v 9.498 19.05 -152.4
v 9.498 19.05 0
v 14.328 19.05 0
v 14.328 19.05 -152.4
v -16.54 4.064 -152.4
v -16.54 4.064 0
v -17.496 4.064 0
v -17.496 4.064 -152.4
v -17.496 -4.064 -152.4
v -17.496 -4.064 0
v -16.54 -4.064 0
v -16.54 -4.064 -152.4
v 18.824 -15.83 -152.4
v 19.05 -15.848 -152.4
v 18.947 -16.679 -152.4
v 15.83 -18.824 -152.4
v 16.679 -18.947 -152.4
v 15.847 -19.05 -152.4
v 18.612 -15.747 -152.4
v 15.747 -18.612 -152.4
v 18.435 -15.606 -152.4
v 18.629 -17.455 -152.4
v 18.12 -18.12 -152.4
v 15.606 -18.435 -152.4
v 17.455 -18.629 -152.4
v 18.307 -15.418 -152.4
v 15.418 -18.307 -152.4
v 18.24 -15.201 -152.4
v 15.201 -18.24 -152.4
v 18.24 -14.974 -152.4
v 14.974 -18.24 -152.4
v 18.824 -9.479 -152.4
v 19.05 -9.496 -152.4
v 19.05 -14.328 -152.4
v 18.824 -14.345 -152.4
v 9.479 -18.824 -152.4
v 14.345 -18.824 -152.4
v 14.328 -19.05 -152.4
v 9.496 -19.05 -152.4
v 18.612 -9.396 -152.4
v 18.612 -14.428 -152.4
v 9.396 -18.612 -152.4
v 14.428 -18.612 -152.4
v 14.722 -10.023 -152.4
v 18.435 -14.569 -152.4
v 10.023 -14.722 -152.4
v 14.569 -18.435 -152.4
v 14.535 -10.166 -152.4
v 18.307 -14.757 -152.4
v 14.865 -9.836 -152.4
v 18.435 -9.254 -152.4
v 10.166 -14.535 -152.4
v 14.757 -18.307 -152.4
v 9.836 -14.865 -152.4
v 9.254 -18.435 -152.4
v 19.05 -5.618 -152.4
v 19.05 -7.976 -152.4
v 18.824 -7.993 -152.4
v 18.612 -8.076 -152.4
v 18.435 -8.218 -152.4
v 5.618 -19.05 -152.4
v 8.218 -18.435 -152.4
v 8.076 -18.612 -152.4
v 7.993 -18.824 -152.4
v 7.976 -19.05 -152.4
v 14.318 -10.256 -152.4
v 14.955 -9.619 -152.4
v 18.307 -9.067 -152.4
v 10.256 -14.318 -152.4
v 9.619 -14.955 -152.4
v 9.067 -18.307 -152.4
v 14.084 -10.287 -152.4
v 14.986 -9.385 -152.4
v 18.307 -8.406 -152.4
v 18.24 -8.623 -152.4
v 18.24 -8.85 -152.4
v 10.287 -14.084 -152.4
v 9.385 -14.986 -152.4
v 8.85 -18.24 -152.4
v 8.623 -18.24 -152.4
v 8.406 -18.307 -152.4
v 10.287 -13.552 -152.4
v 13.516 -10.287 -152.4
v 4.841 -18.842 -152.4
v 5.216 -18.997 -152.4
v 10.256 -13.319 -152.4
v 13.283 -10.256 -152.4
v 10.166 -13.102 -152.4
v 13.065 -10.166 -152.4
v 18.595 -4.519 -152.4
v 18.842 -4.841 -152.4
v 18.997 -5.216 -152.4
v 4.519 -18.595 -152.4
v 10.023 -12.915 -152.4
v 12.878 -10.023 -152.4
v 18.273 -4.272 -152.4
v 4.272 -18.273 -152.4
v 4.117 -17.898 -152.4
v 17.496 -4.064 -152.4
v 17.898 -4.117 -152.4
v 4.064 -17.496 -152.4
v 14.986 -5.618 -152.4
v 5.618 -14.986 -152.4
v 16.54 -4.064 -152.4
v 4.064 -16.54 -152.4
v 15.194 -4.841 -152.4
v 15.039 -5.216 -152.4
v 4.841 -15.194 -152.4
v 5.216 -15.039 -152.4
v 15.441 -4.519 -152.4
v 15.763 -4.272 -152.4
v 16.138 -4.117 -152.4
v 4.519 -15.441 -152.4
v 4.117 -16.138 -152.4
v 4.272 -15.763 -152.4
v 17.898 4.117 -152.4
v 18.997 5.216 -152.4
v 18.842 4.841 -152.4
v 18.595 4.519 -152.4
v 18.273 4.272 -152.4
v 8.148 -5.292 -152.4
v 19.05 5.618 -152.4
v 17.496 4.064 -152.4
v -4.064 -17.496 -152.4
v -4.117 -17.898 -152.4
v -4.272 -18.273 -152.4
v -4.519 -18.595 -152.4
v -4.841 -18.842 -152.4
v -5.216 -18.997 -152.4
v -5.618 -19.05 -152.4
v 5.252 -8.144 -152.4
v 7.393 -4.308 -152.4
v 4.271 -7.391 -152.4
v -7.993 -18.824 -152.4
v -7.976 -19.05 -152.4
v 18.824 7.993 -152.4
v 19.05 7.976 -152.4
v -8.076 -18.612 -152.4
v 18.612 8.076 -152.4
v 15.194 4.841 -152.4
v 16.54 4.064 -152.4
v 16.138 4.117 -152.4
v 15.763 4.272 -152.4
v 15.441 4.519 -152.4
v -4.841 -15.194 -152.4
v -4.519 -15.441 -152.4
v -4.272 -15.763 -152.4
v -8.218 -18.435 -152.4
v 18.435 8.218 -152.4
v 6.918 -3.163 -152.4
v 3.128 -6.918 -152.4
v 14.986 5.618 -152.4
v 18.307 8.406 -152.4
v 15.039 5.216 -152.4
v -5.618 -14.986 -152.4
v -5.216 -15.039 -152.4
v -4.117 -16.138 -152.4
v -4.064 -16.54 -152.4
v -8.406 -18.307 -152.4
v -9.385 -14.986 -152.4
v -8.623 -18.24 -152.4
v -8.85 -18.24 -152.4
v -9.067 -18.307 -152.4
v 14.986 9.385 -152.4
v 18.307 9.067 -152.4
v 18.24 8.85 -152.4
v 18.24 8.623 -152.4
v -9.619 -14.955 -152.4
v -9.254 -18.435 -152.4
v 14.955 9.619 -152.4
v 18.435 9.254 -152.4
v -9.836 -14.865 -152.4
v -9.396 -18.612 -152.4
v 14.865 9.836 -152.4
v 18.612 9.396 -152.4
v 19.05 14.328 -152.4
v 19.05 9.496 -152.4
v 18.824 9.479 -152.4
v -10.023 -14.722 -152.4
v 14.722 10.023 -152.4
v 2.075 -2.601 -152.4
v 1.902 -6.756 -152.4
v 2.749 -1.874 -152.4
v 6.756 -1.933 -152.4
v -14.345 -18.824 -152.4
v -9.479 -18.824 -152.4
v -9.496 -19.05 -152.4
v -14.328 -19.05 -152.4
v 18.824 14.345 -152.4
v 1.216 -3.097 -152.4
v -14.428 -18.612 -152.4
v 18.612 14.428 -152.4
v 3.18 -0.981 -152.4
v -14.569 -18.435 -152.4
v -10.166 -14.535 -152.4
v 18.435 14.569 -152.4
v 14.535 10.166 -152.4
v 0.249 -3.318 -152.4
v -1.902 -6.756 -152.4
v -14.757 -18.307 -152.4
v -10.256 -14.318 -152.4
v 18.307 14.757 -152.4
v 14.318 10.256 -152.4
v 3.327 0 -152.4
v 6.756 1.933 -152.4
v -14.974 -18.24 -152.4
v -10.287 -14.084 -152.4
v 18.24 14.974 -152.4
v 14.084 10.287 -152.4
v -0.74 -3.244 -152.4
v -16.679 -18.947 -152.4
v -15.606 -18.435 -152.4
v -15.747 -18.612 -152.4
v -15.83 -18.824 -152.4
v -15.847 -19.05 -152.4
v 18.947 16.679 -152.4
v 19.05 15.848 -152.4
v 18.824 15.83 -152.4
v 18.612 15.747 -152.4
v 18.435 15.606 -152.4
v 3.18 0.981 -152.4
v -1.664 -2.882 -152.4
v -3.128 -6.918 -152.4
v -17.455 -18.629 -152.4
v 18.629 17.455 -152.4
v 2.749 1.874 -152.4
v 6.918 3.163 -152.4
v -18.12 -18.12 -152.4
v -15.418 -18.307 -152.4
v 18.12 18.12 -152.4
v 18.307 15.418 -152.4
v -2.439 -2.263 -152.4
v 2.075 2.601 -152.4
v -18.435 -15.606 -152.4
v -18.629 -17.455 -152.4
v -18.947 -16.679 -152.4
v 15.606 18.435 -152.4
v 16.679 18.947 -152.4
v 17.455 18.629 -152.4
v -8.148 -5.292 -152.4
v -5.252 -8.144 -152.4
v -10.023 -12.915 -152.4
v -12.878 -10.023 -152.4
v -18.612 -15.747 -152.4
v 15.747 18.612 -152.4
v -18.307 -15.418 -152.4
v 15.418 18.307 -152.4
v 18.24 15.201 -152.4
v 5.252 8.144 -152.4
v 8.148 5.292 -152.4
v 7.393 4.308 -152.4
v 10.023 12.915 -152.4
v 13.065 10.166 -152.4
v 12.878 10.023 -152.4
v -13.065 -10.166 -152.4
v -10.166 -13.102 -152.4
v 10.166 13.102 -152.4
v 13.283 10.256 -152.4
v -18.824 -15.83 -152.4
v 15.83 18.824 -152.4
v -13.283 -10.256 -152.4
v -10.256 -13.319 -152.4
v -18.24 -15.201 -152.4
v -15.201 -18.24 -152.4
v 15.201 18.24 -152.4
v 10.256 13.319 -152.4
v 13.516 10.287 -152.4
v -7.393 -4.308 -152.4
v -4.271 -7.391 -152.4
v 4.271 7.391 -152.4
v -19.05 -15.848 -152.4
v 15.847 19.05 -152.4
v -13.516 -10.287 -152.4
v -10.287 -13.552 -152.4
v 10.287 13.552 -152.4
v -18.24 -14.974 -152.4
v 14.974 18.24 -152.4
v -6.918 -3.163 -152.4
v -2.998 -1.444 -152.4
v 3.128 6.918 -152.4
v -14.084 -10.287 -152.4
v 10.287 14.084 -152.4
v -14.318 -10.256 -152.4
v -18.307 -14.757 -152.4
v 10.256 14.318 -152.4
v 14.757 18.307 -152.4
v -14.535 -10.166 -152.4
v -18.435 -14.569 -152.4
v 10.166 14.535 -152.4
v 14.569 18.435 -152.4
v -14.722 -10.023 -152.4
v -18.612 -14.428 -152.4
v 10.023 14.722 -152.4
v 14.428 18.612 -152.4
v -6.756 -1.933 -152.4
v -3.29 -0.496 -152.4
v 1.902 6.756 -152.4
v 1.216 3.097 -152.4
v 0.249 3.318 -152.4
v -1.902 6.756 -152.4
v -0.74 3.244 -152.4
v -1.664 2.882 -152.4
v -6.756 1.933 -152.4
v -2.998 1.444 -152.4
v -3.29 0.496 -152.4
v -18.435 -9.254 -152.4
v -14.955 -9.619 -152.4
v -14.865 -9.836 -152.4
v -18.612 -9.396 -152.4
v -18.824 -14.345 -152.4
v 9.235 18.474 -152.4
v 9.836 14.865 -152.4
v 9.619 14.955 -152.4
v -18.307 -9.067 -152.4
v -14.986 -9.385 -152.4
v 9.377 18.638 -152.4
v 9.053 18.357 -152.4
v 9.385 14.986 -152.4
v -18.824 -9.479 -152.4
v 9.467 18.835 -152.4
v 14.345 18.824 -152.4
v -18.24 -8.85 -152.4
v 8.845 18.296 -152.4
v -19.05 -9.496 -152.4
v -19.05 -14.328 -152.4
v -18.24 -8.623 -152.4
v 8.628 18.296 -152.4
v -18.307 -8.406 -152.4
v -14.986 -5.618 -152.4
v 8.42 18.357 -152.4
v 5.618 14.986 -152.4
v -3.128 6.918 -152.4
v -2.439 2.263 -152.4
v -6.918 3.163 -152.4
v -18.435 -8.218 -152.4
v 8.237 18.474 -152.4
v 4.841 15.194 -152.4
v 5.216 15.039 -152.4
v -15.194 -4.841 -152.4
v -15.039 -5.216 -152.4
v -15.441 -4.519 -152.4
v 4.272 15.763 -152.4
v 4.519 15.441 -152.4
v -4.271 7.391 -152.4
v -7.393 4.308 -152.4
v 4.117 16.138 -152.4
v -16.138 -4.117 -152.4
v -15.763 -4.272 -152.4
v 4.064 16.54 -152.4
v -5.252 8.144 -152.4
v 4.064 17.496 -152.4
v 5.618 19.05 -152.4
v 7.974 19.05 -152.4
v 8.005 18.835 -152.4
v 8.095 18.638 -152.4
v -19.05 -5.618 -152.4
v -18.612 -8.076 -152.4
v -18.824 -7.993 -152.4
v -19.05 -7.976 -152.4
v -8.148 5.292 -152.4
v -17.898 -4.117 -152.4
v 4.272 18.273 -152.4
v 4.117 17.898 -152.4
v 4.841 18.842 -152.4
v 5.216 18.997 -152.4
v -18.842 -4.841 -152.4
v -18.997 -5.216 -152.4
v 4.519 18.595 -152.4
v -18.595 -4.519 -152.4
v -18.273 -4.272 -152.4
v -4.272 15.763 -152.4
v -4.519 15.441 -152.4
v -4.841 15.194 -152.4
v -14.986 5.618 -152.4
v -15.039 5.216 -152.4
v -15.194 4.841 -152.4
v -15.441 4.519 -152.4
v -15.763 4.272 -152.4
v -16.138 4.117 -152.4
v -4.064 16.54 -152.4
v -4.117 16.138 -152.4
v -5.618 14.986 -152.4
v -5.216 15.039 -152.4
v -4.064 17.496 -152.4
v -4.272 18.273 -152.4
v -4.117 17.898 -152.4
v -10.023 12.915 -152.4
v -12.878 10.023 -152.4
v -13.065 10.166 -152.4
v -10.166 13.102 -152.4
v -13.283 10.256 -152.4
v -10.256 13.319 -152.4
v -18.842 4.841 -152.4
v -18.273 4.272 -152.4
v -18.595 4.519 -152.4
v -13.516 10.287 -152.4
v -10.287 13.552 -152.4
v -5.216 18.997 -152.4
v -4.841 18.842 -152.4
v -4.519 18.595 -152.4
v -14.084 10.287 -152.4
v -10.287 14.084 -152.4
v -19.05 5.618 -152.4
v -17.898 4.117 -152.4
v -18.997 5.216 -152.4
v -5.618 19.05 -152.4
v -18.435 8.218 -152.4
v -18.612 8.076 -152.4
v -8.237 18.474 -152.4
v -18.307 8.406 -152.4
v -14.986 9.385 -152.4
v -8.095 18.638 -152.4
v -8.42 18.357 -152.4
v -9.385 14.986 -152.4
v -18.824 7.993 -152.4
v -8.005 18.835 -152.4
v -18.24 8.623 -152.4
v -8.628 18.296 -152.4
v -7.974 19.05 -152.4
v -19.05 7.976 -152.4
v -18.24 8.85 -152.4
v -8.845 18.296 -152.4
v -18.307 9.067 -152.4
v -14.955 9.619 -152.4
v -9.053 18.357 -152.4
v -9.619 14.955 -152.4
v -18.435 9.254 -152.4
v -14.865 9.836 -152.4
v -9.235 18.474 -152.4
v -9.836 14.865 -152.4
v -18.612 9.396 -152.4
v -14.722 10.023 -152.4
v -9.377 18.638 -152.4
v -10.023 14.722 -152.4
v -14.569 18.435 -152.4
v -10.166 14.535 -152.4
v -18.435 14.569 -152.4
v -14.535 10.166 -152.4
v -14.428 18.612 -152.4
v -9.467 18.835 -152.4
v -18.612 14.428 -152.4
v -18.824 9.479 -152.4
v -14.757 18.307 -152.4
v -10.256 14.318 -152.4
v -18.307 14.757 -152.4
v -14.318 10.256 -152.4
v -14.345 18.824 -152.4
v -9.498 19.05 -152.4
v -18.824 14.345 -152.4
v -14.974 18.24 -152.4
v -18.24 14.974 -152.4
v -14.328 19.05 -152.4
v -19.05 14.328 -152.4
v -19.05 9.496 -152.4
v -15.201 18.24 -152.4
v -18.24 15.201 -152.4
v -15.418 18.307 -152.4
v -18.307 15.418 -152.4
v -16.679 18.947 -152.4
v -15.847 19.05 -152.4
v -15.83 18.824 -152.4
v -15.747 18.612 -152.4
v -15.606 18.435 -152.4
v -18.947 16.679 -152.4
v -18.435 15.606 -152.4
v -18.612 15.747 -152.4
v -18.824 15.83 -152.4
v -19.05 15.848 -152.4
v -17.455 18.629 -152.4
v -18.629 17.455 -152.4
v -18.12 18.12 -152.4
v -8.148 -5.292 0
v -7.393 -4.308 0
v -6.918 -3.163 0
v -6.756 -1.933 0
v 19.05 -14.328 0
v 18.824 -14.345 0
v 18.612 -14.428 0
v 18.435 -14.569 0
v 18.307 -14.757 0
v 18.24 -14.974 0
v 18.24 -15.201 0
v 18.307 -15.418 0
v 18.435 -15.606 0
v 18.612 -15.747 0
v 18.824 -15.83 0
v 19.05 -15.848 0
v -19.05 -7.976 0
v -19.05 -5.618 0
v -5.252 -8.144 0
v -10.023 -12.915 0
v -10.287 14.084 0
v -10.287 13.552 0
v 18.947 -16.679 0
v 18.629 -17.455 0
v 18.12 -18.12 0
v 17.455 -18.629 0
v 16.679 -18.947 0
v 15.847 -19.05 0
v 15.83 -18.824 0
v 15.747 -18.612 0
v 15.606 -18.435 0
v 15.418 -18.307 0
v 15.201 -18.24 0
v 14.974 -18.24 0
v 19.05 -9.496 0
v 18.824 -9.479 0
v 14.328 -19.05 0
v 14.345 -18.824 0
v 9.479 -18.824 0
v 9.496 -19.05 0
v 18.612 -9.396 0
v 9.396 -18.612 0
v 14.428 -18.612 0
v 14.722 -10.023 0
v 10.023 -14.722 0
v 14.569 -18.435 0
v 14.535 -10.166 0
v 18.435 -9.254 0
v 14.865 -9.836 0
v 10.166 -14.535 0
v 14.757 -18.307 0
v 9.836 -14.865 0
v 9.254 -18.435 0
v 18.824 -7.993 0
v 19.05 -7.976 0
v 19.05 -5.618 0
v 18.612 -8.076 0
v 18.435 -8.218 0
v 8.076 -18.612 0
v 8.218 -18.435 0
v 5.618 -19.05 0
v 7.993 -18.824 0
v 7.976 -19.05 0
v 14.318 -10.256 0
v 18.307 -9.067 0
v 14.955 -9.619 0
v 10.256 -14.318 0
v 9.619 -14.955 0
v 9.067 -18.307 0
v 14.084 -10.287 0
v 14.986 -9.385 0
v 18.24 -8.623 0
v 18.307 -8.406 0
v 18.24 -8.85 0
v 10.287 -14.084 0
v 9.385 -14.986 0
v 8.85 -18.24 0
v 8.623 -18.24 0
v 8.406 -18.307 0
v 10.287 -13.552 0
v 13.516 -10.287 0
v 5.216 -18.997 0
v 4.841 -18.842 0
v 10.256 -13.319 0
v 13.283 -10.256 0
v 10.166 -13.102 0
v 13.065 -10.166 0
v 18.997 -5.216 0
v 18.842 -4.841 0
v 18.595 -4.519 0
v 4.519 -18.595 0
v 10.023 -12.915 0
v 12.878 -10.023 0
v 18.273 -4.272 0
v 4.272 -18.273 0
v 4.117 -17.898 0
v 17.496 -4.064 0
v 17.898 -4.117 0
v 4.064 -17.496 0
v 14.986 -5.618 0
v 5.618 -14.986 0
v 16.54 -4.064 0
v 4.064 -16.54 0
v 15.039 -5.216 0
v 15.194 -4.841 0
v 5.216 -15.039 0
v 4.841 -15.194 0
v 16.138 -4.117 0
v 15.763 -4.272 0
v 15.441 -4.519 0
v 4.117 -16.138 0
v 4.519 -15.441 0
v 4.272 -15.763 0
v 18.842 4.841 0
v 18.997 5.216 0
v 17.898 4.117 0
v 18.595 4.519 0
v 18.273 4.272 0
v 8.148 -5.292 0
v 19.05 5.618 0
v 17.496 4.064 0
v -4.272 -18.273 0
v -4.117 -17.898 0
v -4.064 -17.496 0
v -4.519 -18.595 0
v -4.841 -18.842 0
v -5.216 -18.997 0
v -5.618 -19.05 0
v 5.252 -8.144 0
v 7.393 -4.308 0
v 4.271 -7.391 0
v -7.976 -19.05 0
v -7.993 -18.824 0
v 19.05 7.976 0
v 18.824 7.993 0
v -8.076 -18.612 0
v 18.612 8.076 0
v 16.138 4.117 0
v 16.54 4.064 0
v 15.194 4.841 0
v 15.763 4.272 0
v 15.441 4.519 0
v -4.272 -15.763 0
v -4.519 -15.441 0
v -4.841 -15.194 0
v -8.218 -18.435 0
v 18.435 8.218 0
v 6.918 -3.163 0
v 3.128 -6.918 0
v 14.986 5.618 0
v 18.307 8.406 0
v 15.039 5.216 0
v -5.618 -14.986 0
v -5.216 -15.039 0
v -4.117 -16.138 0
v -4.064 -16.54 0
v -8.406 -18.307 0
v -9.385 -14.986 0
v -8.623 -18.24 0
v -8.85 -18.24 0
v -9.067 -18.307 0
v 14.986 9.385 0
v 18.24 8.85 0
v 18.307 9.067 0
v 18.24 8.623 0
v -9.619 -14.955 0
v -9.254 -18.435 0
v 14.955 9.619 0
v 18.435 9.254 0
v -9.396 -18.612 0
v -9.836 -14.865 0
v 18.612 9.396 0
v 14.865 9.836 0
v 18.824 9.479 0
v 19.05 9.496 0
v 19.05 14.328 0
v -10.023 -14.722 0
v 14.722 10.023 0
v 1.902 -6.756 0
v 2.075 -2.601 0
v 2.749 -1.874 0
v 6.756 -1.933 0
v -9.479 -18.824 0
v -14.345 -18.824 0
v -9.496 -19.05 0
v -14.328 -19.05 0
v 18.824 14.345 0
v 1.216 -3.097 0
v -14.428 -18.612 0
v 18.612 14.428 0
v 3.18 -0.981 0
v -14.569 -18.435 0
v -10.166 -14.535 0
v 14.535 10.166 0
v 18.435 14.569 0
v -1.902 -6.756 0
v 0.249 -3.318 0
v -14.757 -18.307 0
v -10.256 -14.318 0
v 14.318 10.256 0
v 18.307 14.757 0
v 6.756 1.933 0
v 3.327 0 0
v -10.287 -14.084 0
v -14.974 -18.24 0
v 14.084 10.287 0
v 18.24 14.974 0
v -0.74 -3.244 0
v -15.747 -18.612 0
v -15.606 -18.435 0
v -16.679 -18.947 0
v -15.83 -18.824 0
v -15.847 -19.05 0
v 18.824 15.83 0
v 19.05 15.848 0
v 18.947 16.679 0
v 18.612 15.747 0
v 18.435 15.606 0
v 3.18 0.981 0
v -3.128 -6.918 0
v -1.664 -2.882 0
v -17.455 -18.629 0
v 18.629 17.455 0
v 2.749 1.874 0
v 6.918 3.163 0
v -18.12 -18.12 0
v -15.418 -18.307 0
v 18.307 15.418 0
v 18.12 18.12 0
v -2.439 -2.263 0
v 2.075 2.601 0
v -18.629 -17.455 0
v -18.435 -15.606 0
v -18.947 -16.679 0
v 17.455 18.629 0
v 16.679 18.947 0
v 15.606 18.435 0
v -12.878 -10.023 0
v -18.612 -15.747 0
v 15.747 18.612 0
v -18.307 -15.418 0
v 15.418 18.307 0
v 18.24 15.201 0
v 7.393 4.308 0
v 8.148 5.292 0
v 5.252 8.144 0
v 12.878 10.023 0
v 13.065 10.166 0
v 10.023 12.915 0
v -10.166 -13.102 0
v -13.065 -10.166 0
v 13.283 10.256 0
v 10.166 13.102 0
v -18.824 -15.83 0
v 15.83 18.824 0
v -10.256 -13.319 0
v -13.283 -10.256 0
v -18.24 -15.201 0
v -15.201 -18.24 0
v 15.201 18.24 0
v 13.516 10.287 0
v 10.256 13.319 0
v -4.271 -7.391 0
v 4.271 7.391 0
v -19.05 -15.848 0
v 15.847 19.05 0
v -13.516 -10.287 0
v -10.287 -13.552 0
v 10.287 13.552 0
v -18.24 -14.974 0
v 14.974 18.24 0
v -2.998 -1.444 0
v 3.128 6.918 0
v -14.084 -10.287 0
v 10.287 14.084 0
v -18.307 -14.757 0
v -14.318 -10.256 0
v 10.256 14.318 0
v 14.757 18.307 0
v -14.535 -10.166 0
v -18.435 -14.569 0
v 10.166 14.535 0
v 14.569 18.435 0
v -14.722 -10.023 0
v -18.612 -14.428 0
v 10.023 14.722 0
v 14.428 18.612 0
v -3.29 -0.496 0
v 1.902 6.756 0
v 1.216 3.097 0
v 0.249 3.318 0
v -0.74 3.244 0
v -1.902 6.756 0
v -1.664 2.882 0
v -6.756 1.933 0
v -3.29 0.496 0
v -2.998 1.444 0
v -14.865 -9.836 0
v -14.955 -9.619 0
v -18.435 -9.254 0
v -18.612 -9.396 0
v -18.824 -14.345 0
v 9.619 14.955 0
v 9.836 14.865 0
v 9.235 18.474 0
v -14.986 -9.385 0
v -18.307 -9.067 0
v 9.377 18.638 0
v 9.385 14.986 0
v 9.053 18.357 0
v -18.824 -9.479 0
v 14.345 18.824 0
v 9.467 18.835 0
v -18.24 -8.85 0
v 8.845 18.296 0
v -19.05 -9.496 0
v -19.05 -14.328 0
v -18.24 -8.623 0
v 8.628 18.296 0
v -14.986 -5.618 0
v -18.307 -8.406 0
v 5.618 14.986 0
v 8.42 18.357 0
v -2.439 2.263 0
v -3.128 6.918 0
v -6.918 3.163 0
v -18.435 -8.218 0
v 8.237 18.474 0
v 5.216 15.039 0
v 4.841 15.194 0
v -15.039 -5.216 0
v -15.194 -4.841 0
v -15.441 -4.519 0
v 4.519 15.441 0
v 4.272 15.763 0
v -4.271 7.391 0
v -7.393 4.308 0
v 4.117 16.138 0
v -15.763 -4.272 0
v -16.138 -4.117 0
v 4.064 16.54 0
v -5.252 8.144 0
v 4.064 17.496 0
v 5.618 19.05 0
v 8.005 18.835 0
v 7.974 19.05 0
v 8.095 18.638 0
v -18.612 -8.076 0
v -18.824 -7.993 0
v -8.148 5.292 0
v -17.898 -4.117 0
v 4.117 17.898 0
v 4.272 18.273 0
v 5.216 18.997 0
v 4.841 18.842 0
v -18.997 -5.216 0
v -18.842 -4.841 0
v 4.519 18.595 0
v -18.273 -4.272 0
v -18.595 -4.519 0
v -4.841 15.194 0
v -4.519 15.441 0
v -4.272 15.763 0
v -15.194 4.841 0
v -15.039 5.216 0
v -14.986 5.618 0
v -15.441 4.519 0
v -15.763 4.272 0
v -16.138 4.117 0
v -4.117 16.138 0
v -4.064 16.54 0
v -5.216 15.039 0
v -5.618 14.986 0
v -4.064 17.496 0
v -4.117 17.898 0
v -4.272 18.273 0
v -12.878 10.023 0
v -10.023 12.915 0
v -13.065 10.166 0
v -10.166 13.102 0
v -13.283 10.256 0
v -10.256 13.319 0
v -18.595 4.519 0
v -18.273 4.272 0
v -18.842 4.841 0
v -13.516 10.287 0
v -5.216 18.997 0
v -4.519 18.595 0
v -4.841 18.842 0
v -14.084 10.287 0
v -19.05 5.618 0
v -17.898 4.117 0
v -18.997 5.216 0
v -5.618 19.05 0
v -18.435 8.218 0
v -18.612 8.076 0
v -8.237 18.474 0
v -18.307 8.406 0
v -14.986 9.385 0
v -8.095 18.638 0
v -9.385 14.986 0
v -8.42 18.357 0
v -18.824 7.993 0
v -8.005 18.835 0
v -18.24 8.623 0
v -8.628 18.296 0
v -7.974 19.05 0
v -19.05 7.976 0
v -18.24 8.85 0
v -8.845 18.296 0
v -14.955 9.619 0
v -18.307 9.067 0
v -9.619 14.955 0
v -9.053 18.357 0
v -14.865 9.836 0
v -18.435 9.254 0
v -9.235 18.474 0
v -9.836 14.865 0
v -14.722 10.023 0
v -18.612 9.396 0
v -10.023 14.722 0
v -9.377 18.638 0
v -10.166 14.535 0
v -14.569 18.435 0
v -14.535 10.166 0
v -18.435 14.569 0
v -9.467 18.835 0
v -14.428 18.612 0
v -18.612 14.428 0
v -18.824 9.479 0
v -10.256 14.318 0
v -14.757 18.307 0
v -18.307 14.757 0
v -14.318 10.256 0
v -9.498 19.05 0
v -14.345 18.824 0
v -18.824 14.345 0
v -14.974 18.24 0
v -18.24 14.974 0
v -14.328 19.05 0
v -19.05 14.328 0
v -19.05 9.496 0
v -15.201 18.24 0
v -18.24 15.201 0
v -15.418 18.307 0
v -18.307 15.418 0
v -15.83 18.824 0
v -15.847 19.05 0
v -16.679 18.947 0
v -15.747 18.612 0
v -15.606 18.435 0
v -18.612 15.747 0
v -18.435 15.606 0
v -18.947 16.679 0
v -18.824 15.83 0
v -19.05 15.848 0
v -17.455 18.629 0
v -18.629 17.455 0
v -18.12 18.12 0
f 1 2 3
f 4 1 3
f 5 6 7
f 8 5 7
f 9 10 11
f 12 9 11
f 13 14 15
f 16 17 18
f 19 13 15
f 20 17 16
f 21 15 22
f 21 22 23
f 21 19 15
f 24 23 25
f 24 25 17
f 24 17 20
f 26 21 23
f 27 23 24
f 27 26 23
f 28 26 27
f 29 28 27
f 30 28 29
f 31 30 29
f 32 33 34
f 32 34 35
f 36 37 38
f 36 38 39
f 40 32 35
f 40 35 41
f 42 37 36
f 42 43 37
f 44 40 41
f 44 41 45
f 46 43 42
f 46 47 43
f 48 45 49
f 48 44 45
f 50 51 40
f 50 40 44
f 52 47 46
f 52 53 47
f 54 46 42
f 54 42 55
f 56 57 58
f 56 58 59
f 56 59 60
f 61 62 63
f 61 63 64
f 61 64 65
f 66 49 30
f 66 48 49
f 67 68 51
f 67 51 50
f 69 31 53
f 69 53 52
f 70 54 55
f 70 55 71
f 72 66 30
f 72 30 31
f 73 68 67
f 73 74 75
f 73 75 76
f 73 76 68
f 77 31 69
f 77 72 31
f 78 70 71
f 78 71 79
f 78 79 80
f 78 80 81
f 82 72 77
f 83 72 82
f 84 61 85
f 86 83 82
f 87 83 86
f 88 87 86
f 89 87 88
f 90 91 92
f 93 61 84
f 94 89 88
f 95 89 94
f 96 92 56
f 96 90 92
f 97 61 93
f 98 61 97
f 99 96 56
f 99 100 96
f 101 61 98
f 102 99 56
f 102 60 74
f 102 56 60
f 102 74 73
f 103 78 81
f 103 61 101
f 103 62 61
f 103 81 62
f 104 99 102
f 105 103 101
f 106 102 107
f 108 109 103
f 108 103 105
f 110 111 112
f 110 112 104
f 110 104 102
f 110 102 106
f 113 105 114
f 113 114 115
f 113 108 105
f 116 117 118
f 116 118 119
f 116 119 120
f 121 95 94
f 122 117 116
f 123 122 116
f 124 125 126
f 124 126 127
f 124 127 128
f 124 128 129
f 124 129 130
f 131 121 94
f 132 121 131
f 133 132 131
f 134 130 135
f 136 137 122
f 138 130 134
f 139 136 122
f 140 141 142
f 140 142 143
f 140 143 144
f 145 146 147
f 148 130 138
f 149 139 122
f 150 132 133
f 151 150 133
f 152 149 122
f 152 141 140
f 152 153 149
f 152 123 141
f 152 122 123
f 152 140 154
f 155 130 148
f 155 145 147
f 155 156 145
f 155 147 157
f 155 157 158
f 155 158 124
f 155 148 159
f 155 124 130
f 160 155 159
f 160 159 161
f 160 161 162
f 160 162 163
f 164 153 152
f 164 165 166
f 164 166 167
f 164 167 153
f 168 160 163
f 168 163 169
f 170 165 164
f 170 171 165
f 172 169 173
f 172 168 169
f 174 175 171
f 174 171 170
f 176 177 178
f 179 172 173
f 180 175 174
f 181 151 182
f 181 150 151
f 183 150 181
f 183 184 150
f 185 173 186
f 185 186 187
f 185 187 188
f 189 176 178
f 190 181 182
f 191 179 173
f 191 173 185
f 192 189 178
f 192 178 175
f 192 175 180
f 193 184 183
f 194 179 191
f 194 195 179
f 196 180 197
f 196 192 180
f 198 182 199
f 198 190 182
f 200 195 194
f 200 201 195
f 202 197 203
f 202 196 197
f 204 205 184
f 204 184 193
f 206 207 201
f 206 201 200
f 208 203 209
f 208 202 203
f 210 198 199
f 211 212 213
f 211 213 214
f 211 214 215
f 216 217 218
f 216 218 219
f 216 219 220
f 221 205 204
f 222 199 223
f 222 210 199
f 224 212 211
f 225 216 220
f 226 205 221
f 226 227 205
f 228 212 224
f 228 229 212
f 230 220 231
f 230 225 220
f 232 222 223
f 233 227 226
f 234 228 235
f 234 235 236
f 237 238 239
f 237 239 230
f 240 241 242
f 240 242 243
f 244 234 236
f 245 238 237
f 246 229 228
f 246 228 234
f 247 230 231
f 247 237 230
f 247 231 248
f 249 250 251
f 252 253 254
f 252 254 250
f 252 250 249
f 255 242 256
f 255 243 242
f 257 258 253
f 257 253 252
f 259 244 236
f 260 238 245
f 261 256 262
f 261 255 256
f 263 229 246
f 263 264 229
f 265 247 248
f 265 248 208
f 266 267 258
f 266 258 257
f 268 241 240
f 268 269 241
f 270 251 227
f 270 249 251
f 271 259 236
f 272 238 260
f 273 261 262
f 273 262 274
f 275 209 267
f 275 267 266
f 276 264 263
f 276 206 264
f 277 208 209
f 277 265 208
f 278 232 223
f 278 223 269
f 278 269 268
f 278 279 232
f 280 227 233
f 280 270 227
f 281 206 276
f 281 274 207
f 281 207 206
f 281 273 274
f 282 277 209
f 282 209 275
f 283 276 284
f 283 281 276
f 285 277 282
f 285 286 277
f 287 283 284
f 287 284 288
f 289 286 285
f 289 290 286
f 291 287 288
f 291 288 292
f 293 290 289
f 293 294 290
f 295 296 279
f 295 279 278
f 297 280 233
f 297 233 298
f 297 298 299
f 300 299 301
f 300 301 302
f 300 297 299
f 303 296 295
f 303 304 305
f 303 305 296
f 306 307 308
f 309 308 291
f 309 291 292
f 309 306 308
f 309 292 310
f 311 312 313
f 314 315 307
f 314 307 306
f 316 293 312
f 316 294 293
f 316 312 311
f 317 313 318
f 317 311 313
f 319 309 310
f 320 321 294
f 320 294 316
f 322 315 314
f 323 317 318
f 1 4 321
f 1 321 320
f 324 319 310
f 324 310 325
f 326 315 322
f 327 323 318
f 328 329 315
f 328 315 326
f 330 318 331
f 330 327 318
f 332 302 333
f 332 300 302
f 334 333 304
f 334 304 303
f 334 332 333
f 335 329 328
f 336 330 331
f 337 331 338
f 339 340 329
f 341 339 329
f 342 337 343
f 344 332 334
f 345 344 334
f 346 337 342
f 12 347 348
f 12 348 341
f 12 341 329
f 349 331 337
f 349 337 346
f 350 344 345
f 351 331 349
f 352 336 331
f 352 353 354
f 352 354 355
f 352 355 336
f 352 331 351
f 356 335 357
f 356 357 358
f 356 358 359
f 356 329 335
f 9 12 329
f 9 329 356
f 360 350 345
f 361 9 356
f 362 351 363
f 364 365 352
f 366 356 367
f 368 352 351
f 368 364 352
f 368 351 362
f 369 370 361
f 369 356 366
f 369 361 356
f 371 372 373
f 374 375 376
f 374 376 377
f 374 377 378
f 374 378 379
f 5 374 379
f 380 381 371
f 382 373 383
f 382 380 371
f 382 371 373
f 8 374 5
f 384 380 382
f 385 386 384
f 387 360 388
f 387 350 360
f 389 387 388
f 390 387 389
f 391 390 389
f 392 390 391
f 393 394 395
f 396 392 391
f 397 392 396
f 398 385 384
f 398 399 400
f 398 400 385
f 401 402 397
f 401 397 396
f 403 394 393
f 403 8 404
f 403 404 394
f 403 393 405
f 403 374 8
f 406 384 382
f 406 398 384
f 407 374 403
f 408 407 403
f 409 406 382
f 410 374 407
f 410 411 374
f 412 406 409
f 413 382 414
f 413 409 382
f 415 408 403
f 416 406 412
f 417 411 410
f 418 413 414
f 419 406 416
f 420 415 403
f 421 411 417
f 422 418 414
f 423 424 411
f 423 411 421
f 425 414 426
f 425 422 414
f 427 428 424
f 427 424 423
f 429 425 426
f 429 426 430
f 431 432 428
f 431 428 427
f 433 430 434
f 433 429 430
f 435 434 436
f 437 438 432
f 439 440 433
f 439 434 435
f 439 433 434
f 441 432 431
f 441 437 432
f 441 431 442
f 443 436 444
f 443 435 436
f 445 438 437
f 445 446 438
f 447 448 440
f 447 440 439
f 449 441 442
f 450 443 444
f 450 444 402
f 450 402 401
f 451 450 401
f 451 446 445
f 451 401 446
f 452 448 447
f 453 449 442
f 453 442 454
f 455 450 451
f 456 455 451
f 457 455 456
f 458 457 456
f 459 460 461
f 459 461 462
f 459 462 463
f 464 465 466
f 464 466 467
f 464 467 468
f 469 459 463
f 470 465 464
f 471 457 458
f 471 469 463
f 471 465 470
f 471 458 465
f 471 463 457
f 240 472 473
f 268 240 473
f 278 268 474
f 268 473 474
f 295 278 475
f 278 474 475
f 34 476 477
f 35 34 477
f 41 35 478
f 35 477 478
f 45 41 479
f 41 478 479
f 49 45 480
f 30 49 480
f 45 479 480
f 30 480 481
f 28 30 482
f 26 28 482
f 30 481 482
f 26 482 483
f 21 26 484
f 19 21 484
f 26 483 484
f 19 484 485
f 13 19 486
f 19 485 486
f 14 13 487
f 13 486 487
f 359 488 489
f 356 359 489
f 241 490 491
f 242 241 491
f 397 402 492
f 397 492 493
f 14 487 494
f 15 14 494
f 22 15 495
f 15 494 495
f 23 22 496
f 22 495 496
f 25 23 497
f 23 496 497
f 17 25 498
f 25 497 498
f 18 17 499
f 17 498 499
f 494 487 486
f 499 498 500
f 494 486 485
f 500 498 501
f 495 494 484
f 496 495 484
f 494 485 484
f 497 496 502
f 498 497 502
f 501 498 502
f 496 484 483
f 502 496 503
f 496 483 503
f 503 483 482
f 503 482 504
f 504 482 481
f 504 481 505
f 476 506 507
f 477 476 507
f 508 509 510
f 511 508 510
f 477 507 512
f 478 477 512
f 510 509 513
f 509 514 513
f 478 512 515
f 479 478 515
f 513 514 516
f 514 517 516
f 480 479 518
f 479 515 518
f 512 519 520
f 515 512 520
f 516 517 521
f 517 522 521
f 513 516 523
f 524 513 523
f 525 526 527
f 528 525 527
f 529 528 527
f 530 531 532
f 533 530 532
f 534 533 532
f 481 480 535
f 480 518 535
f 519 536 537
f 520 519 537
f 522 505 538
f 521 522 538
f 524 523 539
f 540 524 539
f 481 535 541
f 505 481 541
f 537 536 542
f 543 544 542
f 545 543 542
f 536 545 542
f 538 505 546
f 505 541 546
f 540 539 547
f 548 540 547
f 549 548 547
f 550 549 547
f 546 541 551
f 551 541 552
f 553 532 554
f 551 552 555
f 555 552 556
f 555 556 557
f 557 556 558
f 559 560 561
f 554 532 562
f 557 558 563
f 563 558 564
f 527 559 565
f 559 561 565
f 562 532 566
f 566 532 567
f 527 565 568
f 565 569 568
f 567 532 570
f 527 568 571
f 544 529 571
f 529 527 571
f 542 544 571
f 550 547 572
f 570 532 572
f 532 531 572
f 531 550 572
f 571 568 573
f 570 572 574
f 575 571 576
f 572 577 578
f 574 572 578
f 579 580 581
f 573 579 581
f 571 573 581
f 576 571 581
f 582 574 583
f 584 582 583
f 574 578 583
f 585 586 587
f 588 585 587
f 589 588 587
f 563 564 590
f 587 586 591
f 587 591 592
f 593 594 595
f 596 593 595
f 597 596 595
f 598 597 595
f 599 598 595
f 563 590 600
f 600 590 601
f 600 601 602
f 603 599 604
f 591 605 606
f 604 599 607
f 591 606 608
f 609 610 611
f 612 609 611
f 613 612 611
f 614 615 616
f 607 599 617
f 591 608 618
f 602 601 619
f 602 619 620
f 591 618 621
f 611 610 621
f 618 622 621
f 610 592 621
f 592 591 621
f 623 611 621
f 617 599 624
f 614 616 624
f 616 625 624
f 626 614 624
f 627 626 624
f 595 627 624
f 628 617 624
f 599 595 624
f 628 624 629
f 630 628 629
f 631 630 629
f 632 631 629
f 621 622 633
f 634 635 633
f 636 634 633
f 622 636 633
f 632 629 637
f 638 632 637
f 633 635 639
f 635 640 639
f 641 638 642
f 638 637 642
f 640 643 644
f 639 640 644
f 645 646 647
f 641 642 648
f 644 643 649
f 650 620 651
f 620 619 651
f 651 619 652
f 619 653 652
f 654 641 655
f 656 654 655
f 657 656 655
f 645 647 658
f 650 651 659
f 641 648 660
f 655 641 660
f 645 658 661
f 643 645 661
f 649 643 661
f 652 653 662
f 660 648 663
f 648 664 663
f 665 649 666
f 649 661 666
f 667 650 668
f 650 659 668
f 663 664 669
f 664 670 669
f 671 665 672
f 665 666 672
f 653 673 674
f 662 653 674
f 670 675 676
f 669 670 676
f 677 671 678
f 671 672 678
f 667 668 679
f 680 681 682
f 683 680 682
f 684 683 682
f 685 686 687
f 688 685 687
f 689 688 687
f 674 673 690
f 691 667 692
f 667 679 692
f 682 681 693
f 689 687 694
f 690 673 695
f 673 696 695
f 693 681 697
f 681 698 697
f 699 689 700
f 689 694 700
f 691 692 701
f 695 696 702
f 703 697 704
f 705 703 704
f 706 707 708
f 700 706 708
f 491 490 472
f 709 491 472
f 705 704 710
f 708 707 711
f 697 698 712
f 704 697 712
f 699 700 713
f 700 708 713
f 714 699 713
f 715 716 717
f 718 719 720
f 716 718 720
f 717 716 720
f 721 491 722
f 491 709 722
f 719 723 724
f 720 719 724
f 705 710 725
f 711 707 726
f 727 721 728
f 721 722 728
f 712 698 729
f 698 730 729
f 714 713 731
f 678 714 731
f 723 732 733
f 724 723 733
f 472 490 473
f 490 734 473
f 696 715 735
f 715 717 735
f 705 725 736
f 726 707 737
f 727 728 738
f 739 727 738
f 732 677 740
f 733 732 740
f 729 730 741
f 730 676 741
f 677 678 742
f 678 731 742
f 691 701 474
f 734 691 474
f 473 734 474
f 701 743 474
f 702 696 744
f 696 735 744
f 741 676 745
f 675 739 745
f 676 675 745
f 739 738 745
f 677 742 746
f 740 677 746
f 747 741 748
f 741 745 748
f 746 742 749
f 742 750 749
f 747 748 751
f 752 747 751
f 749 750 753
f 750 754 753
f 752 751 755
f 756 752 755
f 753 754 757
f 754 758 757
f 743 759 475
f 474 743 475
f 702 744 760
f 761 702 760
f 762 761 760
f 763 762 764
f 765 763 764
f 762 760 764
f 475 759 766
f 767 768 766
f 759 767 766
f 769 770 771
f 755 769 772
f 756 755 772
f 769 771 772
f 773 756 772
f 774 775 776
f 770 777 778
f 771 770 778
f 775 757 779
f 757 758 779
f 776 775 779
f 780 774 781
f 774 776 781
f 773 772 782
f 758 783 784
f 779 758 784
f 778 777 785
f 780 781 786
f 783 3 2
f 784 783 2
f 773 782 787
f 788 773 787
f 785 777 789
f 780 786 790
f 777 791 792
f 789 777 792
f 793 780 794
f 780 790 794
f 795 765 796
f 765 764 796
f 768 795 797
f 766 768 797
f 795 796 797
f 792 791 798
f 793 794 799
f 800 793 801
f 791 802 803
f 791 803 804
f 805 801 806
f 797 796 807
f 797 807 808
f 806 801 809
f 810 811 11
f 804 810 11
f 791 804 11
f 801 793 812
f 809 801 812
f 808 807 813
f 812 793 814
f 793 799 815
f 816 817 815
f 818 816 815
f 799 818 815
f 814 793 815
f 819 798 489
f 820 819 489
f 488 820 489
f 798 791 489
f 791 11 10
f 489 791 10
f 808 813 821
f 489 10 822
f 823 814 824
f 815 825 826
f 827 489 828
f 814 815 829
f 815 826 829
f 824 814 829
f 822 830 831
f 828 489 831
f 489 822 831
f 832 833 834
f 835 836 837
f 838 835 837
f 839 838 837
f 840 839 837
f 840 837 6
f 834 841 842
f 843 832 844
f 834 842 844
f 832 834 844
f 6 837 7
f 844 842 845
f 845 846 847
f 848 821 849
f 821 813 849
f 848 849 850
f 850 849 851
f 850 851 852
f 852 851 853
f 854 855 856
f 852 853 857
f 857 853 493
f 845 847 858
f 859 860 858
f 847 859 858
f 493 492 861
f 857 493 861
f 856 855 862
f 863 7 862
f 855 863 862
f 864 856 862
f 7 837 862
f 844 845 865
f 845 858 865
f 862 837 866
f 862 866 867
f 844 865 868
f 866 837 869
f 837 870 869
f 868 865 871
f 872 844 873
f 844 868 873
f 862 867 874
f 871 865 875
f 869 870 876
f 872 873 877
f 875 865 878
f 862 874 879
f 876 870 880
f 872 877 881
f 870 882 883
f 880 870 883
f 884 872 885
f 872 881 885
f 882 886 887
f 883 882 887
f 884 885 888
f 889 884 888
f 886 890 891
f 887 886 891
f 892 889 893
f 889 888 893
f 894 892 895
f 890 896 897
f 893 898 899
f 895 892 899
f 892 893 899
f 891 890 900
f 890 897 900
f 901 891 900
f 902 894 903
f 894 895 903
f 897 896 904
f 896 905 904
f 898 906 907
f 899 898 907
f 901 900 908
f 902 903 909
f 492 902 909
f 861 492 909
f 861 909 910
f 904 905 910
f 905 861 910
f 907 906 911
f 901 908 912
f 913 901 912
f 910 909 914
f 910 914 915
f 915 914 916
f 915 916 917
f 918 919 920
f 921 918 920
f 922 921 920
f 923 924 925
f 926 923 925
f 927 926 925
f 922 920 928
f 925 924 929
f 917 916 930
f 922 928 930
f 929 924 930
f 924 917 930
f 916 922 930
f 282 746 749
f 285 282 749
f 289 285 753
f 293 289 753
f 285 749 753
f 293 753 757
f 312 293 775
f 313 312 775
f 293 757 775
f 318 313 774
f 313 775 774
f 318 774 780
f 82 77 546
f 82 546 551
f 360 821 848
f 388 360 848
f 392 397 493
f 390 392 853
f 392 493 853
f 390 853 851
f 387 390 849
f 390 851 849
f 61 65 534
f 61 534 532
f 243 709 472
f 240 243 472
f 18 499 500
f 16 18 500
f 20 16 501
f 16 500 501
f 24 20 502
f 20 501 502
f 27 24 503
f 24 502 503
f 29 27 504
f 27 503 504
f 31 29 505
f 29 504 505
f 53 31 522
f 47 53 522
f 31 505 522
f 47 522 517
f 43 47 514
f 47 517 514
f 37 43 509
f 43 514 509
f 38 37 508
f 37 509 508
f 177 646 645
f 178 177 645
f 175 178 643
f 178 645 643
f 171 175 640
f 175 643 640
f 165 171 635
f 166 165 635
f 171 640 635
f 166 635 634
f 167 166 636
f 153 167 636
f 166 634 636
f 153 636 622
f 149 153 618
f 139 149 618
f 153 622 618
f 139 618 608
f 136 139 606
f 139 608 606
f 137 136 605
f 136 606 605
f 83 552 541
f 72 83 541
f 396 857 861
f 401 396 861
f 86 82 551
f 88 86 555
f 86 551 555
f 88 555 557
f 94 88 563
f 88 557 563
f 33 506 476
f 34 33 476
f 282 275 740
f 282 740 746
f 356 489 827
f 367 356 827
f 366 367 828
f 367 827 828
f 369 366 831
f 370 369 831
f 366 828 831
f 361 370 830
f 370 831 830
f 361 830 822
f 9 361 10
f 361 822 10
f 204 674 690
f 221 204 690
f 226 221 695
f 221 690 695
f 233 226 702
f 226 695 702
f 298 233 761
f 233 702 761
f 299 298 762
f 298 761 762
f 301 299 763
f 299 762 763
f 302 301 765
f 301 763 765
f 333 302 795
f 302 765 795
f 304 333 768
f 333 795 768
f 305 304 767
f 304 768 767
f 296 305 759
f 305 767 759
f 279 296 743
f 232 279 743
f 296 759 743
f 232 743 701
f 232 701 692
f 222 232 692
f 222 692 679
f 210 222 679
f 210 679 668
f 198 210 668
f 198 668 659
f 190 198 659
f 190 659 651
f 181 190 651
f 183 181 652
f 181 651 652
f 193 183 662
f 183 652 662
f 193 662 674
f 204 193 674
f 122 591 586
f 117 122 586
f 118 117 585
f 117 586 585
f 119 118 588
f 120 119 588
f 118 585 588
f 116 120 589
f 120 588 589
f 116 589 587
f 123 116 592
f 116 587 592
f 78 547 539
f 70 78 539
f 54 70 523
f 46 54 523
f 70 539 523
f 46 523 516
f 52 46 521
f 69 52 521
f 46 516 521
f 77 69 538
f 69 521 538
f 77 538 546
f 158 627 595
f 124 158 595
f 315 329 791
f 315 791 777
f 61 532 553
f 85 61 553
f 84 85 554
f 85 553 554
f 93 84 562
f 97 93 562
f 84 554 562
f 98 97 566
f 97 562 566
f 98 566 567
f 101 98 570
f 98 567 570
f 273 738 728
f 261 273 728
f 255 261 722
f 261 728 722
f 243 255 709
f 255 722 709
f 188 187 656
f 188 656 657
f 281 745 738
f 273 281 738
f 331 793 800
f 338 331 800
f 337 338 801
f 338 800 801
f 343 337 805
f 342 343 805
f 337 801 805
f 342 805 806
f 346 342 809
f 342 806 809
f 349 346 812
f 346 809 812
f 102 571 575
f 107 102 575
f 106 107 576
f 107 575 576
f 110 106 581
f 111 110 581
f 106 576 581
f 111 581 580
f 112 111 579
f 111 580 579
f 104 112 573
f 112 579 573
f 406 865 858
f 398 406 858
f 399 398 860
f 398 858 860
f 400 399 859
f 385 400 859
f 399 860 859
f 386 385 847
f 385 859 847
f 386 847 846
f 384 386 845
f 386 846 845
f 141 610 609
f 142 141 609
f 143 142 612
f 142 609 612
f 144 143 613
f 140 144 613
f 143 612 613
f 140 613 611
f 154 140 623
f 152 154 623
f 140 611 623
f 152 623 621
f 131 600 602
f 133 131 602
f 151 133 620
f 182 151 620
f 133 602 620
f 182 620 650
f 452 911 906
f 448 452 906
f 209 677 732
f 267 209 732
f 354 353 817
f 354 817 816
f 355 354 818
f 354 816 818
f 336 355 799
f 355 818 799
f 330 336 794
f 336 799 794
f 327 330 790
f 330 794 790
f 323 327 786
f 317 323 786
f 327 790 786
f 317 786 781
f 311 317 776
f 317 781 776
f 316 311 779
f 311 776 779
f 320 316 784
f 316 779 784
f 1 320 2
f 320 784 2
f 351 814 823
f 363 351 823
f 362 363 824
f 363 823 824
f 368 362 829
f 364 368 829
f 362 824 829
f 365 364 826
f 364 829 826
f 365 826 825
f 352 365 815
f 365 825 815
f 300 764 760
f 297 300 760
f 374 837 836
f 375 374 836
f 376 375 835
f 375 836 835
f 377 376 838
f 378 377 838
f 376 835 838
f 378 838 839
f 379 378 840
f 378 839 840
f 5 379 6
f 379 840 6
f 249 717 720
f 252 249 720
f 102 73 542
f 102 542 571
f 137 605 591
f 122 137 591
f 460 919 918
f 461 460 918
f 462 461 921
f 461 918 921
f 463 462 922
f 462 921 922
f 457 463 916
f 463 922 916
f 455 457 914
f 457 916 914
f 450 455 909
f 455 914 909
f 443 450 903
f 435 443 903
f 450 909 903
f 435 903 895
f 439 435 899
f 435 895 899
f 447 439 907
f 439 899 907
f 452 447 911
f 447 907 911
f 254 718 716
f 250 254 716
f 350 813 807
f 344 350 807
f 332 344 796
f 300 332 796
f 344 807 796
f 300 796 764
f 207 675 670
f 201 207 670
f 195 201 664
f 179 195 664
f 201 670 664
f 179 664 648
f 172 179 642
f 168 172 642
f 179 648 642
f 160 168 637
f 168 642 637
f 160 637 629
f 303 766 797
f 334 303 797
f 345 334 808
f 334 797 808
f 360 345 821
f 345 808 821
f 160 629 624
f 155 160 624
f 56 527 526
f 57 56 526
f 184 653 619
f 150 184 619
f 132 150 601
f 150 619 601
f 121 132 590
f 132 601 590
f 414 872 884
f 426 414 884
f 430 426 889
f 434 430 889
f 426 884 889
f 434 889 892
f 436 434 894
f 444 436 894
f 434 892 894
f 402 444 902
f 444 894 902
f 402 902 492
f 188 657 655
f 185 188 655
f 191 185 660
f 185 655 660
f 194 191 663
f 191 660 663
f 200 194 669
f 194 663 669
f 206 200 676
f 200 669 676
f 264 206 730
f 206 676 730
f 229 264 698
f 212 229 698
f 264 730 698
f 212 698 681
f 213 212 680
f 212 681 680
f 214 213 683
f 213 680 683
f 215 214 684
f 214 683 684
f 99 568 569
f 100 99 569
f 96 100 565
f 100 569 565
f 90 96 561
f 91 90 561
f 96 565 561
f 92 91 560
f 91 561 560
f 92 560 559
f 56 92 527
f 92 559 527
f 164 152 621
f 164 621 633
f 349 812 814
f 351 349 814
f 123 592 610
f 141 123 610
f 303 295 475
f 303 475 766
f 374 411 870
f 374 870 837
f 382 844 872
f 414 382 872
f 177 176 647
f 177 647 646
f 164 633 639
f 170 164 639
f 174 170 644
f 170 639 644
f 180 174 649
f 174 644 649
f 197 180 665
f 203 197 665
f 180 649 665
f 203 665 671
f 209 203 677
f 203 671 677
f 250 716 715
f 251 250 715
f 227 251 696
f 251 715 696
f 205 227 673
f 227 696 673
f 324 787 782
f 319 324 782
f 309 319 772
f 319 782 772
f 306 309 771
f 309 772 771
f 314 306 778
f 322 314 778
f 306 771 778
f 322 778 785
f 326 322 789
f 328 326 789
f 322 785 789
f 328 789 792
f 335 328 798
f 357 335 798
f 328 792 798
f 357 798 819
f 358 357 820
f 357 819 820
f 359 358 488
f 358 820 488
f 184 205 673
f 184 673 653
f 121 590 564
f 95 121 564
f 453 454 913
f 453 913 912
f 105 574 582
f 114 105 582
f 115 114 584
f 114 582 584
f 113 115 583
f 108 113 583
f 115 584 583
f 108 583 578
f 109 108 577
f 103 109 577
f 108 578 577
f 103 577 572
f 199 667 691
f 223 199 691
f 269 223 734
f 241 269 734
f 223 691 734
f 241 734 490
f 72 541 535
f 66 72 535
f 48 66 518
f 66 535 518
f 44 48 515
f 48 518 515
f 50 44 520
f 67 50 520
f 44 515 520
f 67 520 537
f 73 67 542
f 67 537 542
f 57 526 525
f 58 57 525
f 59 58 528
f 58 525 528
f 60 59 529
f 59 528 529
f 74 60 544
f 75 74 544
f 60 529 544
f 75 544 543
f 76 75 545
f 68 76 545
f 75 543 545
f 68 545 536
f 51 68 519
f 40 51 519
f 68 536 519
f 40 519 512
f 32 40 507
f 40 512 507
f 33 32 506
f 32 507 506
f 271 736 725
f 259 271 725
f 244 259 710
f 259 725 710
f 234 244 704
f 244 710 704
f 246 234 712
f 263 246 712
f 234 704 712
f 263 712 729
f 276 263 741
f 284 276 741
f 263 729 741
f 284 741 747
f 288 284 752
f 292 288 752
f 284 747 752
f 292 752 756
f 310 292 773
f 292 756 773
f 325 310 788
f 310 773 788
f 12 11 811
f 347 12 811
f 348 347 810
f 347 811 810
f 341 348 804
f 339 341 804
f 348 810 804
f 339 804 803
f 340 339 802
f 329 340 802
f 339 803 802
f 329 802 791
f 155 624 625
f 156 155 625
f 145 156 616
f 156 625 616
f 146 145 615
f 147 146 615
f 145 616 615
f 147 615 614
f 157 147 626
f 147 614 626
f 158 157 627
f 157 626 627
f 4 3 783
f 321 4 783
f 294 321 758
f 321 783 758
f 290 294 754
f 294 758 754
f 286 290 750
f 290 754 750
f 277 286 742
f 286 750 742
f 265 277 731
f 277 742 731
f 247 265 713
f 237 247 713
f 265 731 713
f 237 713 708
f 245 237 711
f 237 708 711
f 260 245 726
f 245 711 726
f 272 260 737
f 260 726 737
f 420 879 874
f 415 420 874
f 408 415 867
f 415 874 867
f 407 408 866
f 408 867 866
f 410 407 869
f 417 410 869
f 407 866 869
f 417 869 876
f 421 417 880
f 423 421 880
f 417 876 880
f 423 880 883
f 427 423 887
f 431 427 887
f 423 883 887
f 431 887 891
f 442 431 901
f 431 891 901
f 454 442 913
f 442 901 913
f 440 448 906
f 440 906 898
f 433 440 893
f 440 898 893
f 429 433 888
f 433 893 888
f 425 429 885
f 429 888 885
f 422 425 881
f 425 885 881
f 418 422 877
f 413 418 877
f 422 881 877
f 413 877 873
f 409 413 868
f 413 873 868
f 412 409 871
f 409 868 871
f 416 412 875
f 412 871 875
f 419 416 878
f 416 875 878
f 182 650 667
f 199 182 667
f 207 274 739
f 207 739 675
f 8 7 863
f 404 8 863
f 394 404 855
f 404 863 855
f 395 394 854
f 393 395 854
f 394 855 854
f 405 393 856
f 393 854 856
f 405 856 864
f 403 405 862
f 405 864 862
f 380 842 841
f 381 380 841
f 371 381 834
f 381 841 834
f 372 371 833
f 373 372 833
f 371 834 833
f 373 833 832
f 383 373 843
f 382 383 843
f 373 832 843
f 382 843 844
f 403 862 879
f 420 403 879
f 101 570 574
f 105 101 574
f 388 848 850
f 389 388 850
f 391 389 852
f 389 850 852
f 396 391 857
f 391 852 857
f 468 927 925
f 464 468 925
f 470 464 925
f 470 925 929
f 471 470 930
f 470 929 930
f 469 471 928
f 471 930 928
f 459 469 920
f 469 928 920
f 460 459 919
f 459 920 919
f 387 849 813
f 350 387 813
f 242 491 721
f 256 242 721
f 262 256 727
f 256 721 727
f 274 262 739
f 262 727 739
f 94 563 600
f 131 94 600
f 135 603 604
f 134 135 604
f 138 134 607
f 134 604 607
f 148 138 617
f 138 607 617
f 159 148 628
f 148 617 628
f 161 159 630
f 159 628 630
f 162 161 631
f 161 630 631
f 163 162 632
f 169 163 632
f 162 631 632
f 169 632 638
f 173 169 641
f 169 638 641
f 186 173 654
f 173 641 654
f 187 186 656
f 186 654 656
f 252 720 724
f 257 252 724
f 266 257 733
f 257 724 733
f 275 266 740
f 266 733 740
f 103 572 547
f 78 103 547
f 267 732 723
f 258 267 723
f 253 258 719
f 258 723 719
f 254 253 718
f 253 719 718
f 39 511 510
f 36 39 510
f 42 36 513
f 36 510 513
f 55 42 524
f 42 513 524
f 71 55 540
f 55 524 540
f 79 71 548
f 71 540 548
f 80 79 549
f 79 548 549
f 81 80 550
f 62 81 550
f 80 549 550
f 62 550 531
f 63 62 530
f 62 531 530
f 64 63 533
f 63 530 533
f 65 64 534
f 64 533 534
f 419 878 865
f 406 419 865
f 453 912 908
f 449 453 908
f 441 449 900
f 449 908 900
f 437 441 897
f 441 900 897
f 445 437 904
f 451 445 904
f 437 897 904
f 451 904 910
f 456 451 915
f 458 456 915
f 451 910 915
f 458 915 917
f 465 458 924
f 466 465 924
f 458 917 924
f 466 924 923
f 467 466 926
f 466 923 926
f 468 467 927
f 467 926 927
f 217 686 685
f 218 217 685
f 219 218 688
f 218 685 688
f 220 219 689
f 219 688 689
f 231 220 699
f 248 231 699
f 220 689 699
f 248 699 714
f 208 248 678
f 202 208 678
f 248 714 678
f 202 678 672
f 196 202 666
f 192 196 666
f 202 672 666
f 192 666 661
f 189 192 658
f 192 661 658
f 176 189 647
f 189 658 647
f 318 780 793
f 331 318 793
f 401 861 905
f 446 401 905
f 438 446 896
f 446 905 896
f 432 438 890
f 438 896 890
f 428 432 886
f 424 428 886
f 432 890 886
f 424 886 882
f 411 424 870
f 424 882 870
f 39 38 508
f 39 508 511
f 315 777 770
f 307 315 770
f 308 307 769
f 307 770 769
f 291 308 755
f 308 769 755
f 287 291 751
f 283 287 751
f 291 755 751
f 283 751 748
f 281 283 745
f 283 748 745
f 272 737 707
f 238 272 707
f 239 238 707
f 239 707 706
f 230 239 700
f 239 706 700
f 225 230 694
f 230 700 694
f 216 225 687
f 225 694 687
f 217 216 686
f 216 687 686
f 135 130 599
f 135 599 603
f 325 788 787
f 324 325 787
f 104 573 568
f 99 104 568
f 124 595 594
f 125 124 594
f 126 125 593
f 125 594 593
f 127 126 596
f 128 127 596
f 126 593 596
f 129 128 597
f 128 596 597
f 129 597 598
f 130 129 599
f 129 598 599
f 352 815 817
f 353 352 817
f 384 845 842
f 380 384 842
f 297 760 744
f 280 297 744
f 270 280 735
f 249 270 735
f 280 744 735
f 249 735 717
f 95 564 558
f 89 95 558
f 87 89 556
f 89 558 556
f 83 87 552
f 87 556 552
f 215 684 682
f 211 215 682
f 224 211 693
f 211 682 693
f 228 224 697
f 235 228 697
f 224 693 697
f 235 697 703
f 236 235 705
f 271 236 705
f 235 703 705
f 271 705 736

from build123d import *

# Parameters (mm, degrees)
SKETCH1_R      = 3.3274
EXTRUDE1_DEPTH = 152.4


with BuildPart() as part:
    # Sketch1 → Extrude1 (new body)
    with BuildSketch(Plane.XY):
        with BuildLine():
            Line((-10.022898969, 12.91475973), (-5.252158105, 8.144007132))
            ThreePointArc((-5.252158105, 8.144007132), (-3.715177372, 7.117027388), (-1.902183975, 6.7564))
            Line((-1.902183975, 6.7564), (1.902183975, 6.7564))
            ThreePointArc((1.902183975, 6.7564), (3.715177372, 7.117027388), (5.252158105, 8.144007132))
            Line((5.252158105, 8.144007132), (10.022898969, 12.91475973))
            ThreePointArc((10.022898969, 12.91475973), (10.218362387, 13.207291992), (10.287, 13.552357131))
            Line((10.287, 13.552357131), (10.287, 14.0843))
            ThreePointArc((10.287, 14.0843), (10.022898185, 14.721898185), (9.3853, 14.986))
            Line((9.3853, 14.986), (5.617617549, 14.986))
            ThreePointArc((5.617617549, 14.986), (4.519044045, 15.441044045), (4.064, 16.539617549))
            Line((4.064, 16.539617549), (4.064, 17.496382451))
            ThreePointArc((4.064, 17.496382451), (4.519044045, 18.594955955), (5.617617549, 19.05))
            Line((5.617617549, 19.05), (7.974178704, 19.05))
            ThreePointArc((7.974178704, 19.05), (8.736178704, 18.288), (9.498178704, 19.05))
            Line((9.498178704, 19.05), (14.327719207, 19.05))
            ThreePointArc((14.327719207, 19.05), (15.087603123, 18.231251131), (15.847487039, 19.05))
            ThreePointArc((15.847487039, 19.05), (18.120176289, 18.120192083), (19.05, 15.847509295))
            ThreePointArc((19.05, 15.847509295), (18.231250992, 15.08762539), (19.05, 14.327741484))
            Line((19.05, 14.327741484), (19.05, 9.496091471))
            ThreePointArc((19.05, 9.496091471), (18.231250992, 8.736207565), (19.05, 7.97632366))
            Line((19.05, 7.97632366), (19.05, 5.617617549))
            ThreePointArc((19.05, 5.617617549), (18.594955955, 4.519044045), (17.496382451, 4.064))
            Line((17.496382451, 4.064), (16.539617549, 4.064))
            ThreePointArc((16.539617549, 4.064), (15.441044045, 4.519044045), (14.986, 5.617617549))
            Line((14.986, 5.617617549), (14.986, 9.385342516))
            ThreePointArc((14.986, 9.385342516), (14.721898185, 10.022940701), (14.0843, 10.287042516))
            Line((14.0843, 10.287042516), (13.516042086, 10.287042516))
            ThreePointArc((13.516042086, 10.287042516), (13.170975923, 10.218404478), (12.878443117, 10.022939917))
            Line((12.878443117, 10.022939917), (8.14758008, 5.292065243))
            ThreePointArc((8.14758008, 5.292065243), (7.117955879, 3.751120653), (6.7564, 1.933453584))
            Line((6.7564, 1.933453584), (6.7564, -1.933453584))
            ThreePointArc((6.7564, -1.933453584), (7.117955879, -3.751120653), (8.14758008, -5.292065243))
            Line((8.14758008, -5.292065243), (12.878443117, -10.022939917))
            ThreePointArc((12.878443117, -10.022939917), (13.170975923, -10.218404478), (13.516042086, -10.287042516))
            Line((13.516042086, -10.287042516), (14.0843, -10.287042516))
            ThreePointArc((14.0843, -10.287042516), (14.721898185, -10.022940701), (14.986, -9.385342516))
            Line((14.986, -9.385342516), (14.986, -5.617617549))
            ThreePointArc((14.986, -5.617617549), (15.441044045, -4.519044045), (16.539617549, -4.064))
            Line((16.539617549, -4.064), (17.496382451, -4.064))
            ThreePointArc((17.496382451, -4.064), (18.594955955, -4.519044045), (19.05, -5.617617549))
            Line((19.05, -5.617617549), (19.05, -7.976318491))
            ThreePointArc((19.05, -7.976318491), (18.231250992, -8.736202396), (19.05, -9.496086302))
            Line((19.05, -9.496086302), (19.05, -14.32774291))
            ThreePointArc((19.05, -14.32774291), (18.231250992, -15.087626816), (19.05, -15.847510721))
            ThreePointArc((19.05, -15.847510721), (18.120175716, -18.120192644), (15.847486868, -19.05))
            ThreePointArc((15.847486868, -19.05), (15.087602952, -18.231251131), (14.327719036, -19.05))
            Line((14.327719036, -19.05), (9.496062448, -19.05))
            ThreePointArc((9.496062448, -19.05), (8.736178532, -18.231251131), (7.976294616, -19.05))
            Line((7.976294616, -19.05), (5.617617549, -19.05))
            ThreePointArc((5.617617549, -19.05), (4.519044045, -18.594955955), (4.064, -17.496382451))
            Line((4.064, -17.496382451), (4.064, -16.539617549))
            ThreePointArc((4.064, -16.539617549), (4.519044045, -15.441044045), (5.617617549, -14.986))
            Line((5.617617549, -14.986), (9.3853, -14.986))
            ThreePointArc((9.3853, -14.986), (10.022898185, -14.721898185), (10.287, -14.0843))
            Line((10.287, -14.0843), (10.287, -13.552357131))
            ThreePointArc((10.287, -13.552357131), (10.218362387, -13.207291992), (10.022898969, -12.91475973))
            Line((10.022898969, -12.91475973), (5.252158105, -8.144007132))
            ThreePointArc((5.252158105, -8.144007132), (3.715177372, -7.117027388), (1.902183975, -6.7564))
            Line((1.902183975, -6.7564), (-1.902183975, -6.7564))
            ThreePointArc((-1.902183975, -6.7564), (-3.715177372, -7.117027388), (-5.252158105, -8.144007132))
            Line((-5.252158105, -8.144007132), (-10.022898969, -12.91475973))
            ThreePointArc((-10.022898969, -12.91475973), (-10.218362387, -13.207291992), (-10.287, -13.552357131))
            Line((-10.287, -13.552357131), (-10.287, -14.0843))
            ThreePointArc((-10.287, -14.0843), (-10.022898185, -14.721898185), (-9.3853, -14.986))
            Line((-9.3853, -14.986), (-5.617617549, -14.986))
            ThreePointArc((-5.617617549, -14.986), (-4.519044045, -15.441044045), (-4.064, -16.539617549))
            Line((-4.064, -16.539617549), (-4.064, -17.496382451))
            ThreePointArc((-4.064, -17.496382451), (-4.519044045, -18.594955955), (-5.617617549, -19.05))
            Line((-5.617617549, -19.05), (-7.976294616, -19.05))
            ThreePointArc((-7.976294616, -19.05), (-8.736178532, -18.231251131), (-9.496062448, -19.05))
            Line((-9.496062448, -19.05), (-14.327719036, -19.05))
            ThreePointArc((-14.327719036, -19.05), (-15.087602952, -18.231251131), (-15.847486868, -19.05))
            ThreePointArc((-15.847486868, -19.05), (-18.120175716, -18.120192644), (-19.05, -15.847510721))
            ThreePointArc((-19.05, -15.847510721), (-18.231250992, -15.087626816), (-19.05, -14.32774291))
            Line((-19.05, -14.32774291), (-19.05, -9.496086302))
            ThreePointArc((-19.05, -9.496086302), (-18.231250992, -8.736202396), (-19.05, -7.976318491))
            Line((-19.05, -7.976318491), (-19.05, -5.617617549))
            ThreePointArc((-19.05, -5.617617549), (-18.594955955, -4.519044045), (-17.496382451, -4.064))
            Line((-17.496382451, -4.064), (-16.539617549, -4.064))
            ThreePointArc((-16.539617549, -4.064), (-15.441044045, -4.519044045), (-14.986, -5.617617549))
            Line((-14.986, -5.617617549), (-14.986, -9.385342516))
            ThreePointArc((-14.986, -9.385342516), (-14.721898185, -10.022940701), (-14.0843, -10.287042516))
            Line((-14.0843, -10.287042516), (-13.516042086, -10.287042516))
            ThreePointArc((-13.516042086, -10.287042516), (-13.170975923, -10.218404478), (-12.878443117, -10.022939917))
            Line((-12.878443117, -10.022939917), (-8.14758008, -5.292065243))
            ThreePointArc((-8.14758008, -5.292065243), (-7.117955879, -3.751120653), (-6.7564, -1.933453584))
            Line((-6.7564, -1.933453584), (-6.7564, 1.933453584))
            ThreePointArc((-6.7564, 1.933453584), (-7.117955879, 3.751120653), (-8.14758008, 5.292065243))
            Line((-8.14758008, 5.292065243), (-12.878443117, 10.022939917))
            ThreePointArc((-12.878443117, 10.022939917), (-13.170975923, 10.218404478), (-13.516042086, 10.287042516))
            Line((-13.516042086, 10.287042516), (-14.0843, 10.287042516))
            ThreePointArc((-14.0843, 10.287042516), (-14.721898185, 10.022940701), (-14.986, 9.385342516))
            Line((-14.986, 9.385342516), (-14.986, 5.617617549))
            ThreePointArc((-14.986, 5.617617549), (-15.441044045, 4.519044045), (-16.539617549, 4.064))
            Line((-16.539617549, 4.064), (-17.496382451, 4.064))
            ThreePointArc((-17.496382451, 4.064), (-18.594955955, 4.519044045), (-19.05, 5.617617549))
            Line((-19.05, 5.617617549), (-19.05, 7.97632366))
            ThreePointArc((-19.05, 7.97632366), (-18.231250992, 8.736207565), (-19.05, 9.496091471))
            Line((-19.05, 9.496091471), (-19.05, 14.327741484))
            ThreePointArc((-19.05, 14.327741484), (-18.231250992, 15.08762539), (-19.05, 15.847509295))
            ThreePointArc((-19.05, 15.847509295), (-18.120176289, 18.120192083), (-15.847487039, 19.05))
            ThreePointArc((-15.847487039, 19.05), (-15.087603123, 18.231251131), (-14.327719207, 19.05))
            Line((-14.327719207, 19.05), (-9.498178704, 19.05))
            ThreePointArc((-9.498178704, 19.05), (-8.736178704, 18.288), (-7.974178704, 19.05))
            Line((-7.974178704, 19.05), (-5.617617549, 19.05))
            ThreePointArc((-5.617617549, 19.05), (-4.519044045, 18.594955955), (-4.064, 17.496382451))
            Line((-4.064, 17.496382451), (-4.064, 16.539617549))
            ThreePointArc((-4.064, 16.539617549), (-4.519044045, 15.441044045), (-5.617617549, 14.986))
            Line((-5.617617549, 14.986), (-9.3853, 14.986))
            ThreePointArc((-9.3853, 14.986), (-10.022898185, 14.721898185), (-10.287, 14.0843))
            Line((-10.287, 14.0843), (-10.287, 13.552357131))
            ThreePointArc((-10.287, 13.552357131), (-10.218362387, 13.207291992), (-10.022898969, 12.91475973))
        make_face()
        Circle(SKETCH1_R, mode=Mode.SUBTRACT)
    extrude(amount=-EXTRUDE1_DEPTH)


solid = part.part
